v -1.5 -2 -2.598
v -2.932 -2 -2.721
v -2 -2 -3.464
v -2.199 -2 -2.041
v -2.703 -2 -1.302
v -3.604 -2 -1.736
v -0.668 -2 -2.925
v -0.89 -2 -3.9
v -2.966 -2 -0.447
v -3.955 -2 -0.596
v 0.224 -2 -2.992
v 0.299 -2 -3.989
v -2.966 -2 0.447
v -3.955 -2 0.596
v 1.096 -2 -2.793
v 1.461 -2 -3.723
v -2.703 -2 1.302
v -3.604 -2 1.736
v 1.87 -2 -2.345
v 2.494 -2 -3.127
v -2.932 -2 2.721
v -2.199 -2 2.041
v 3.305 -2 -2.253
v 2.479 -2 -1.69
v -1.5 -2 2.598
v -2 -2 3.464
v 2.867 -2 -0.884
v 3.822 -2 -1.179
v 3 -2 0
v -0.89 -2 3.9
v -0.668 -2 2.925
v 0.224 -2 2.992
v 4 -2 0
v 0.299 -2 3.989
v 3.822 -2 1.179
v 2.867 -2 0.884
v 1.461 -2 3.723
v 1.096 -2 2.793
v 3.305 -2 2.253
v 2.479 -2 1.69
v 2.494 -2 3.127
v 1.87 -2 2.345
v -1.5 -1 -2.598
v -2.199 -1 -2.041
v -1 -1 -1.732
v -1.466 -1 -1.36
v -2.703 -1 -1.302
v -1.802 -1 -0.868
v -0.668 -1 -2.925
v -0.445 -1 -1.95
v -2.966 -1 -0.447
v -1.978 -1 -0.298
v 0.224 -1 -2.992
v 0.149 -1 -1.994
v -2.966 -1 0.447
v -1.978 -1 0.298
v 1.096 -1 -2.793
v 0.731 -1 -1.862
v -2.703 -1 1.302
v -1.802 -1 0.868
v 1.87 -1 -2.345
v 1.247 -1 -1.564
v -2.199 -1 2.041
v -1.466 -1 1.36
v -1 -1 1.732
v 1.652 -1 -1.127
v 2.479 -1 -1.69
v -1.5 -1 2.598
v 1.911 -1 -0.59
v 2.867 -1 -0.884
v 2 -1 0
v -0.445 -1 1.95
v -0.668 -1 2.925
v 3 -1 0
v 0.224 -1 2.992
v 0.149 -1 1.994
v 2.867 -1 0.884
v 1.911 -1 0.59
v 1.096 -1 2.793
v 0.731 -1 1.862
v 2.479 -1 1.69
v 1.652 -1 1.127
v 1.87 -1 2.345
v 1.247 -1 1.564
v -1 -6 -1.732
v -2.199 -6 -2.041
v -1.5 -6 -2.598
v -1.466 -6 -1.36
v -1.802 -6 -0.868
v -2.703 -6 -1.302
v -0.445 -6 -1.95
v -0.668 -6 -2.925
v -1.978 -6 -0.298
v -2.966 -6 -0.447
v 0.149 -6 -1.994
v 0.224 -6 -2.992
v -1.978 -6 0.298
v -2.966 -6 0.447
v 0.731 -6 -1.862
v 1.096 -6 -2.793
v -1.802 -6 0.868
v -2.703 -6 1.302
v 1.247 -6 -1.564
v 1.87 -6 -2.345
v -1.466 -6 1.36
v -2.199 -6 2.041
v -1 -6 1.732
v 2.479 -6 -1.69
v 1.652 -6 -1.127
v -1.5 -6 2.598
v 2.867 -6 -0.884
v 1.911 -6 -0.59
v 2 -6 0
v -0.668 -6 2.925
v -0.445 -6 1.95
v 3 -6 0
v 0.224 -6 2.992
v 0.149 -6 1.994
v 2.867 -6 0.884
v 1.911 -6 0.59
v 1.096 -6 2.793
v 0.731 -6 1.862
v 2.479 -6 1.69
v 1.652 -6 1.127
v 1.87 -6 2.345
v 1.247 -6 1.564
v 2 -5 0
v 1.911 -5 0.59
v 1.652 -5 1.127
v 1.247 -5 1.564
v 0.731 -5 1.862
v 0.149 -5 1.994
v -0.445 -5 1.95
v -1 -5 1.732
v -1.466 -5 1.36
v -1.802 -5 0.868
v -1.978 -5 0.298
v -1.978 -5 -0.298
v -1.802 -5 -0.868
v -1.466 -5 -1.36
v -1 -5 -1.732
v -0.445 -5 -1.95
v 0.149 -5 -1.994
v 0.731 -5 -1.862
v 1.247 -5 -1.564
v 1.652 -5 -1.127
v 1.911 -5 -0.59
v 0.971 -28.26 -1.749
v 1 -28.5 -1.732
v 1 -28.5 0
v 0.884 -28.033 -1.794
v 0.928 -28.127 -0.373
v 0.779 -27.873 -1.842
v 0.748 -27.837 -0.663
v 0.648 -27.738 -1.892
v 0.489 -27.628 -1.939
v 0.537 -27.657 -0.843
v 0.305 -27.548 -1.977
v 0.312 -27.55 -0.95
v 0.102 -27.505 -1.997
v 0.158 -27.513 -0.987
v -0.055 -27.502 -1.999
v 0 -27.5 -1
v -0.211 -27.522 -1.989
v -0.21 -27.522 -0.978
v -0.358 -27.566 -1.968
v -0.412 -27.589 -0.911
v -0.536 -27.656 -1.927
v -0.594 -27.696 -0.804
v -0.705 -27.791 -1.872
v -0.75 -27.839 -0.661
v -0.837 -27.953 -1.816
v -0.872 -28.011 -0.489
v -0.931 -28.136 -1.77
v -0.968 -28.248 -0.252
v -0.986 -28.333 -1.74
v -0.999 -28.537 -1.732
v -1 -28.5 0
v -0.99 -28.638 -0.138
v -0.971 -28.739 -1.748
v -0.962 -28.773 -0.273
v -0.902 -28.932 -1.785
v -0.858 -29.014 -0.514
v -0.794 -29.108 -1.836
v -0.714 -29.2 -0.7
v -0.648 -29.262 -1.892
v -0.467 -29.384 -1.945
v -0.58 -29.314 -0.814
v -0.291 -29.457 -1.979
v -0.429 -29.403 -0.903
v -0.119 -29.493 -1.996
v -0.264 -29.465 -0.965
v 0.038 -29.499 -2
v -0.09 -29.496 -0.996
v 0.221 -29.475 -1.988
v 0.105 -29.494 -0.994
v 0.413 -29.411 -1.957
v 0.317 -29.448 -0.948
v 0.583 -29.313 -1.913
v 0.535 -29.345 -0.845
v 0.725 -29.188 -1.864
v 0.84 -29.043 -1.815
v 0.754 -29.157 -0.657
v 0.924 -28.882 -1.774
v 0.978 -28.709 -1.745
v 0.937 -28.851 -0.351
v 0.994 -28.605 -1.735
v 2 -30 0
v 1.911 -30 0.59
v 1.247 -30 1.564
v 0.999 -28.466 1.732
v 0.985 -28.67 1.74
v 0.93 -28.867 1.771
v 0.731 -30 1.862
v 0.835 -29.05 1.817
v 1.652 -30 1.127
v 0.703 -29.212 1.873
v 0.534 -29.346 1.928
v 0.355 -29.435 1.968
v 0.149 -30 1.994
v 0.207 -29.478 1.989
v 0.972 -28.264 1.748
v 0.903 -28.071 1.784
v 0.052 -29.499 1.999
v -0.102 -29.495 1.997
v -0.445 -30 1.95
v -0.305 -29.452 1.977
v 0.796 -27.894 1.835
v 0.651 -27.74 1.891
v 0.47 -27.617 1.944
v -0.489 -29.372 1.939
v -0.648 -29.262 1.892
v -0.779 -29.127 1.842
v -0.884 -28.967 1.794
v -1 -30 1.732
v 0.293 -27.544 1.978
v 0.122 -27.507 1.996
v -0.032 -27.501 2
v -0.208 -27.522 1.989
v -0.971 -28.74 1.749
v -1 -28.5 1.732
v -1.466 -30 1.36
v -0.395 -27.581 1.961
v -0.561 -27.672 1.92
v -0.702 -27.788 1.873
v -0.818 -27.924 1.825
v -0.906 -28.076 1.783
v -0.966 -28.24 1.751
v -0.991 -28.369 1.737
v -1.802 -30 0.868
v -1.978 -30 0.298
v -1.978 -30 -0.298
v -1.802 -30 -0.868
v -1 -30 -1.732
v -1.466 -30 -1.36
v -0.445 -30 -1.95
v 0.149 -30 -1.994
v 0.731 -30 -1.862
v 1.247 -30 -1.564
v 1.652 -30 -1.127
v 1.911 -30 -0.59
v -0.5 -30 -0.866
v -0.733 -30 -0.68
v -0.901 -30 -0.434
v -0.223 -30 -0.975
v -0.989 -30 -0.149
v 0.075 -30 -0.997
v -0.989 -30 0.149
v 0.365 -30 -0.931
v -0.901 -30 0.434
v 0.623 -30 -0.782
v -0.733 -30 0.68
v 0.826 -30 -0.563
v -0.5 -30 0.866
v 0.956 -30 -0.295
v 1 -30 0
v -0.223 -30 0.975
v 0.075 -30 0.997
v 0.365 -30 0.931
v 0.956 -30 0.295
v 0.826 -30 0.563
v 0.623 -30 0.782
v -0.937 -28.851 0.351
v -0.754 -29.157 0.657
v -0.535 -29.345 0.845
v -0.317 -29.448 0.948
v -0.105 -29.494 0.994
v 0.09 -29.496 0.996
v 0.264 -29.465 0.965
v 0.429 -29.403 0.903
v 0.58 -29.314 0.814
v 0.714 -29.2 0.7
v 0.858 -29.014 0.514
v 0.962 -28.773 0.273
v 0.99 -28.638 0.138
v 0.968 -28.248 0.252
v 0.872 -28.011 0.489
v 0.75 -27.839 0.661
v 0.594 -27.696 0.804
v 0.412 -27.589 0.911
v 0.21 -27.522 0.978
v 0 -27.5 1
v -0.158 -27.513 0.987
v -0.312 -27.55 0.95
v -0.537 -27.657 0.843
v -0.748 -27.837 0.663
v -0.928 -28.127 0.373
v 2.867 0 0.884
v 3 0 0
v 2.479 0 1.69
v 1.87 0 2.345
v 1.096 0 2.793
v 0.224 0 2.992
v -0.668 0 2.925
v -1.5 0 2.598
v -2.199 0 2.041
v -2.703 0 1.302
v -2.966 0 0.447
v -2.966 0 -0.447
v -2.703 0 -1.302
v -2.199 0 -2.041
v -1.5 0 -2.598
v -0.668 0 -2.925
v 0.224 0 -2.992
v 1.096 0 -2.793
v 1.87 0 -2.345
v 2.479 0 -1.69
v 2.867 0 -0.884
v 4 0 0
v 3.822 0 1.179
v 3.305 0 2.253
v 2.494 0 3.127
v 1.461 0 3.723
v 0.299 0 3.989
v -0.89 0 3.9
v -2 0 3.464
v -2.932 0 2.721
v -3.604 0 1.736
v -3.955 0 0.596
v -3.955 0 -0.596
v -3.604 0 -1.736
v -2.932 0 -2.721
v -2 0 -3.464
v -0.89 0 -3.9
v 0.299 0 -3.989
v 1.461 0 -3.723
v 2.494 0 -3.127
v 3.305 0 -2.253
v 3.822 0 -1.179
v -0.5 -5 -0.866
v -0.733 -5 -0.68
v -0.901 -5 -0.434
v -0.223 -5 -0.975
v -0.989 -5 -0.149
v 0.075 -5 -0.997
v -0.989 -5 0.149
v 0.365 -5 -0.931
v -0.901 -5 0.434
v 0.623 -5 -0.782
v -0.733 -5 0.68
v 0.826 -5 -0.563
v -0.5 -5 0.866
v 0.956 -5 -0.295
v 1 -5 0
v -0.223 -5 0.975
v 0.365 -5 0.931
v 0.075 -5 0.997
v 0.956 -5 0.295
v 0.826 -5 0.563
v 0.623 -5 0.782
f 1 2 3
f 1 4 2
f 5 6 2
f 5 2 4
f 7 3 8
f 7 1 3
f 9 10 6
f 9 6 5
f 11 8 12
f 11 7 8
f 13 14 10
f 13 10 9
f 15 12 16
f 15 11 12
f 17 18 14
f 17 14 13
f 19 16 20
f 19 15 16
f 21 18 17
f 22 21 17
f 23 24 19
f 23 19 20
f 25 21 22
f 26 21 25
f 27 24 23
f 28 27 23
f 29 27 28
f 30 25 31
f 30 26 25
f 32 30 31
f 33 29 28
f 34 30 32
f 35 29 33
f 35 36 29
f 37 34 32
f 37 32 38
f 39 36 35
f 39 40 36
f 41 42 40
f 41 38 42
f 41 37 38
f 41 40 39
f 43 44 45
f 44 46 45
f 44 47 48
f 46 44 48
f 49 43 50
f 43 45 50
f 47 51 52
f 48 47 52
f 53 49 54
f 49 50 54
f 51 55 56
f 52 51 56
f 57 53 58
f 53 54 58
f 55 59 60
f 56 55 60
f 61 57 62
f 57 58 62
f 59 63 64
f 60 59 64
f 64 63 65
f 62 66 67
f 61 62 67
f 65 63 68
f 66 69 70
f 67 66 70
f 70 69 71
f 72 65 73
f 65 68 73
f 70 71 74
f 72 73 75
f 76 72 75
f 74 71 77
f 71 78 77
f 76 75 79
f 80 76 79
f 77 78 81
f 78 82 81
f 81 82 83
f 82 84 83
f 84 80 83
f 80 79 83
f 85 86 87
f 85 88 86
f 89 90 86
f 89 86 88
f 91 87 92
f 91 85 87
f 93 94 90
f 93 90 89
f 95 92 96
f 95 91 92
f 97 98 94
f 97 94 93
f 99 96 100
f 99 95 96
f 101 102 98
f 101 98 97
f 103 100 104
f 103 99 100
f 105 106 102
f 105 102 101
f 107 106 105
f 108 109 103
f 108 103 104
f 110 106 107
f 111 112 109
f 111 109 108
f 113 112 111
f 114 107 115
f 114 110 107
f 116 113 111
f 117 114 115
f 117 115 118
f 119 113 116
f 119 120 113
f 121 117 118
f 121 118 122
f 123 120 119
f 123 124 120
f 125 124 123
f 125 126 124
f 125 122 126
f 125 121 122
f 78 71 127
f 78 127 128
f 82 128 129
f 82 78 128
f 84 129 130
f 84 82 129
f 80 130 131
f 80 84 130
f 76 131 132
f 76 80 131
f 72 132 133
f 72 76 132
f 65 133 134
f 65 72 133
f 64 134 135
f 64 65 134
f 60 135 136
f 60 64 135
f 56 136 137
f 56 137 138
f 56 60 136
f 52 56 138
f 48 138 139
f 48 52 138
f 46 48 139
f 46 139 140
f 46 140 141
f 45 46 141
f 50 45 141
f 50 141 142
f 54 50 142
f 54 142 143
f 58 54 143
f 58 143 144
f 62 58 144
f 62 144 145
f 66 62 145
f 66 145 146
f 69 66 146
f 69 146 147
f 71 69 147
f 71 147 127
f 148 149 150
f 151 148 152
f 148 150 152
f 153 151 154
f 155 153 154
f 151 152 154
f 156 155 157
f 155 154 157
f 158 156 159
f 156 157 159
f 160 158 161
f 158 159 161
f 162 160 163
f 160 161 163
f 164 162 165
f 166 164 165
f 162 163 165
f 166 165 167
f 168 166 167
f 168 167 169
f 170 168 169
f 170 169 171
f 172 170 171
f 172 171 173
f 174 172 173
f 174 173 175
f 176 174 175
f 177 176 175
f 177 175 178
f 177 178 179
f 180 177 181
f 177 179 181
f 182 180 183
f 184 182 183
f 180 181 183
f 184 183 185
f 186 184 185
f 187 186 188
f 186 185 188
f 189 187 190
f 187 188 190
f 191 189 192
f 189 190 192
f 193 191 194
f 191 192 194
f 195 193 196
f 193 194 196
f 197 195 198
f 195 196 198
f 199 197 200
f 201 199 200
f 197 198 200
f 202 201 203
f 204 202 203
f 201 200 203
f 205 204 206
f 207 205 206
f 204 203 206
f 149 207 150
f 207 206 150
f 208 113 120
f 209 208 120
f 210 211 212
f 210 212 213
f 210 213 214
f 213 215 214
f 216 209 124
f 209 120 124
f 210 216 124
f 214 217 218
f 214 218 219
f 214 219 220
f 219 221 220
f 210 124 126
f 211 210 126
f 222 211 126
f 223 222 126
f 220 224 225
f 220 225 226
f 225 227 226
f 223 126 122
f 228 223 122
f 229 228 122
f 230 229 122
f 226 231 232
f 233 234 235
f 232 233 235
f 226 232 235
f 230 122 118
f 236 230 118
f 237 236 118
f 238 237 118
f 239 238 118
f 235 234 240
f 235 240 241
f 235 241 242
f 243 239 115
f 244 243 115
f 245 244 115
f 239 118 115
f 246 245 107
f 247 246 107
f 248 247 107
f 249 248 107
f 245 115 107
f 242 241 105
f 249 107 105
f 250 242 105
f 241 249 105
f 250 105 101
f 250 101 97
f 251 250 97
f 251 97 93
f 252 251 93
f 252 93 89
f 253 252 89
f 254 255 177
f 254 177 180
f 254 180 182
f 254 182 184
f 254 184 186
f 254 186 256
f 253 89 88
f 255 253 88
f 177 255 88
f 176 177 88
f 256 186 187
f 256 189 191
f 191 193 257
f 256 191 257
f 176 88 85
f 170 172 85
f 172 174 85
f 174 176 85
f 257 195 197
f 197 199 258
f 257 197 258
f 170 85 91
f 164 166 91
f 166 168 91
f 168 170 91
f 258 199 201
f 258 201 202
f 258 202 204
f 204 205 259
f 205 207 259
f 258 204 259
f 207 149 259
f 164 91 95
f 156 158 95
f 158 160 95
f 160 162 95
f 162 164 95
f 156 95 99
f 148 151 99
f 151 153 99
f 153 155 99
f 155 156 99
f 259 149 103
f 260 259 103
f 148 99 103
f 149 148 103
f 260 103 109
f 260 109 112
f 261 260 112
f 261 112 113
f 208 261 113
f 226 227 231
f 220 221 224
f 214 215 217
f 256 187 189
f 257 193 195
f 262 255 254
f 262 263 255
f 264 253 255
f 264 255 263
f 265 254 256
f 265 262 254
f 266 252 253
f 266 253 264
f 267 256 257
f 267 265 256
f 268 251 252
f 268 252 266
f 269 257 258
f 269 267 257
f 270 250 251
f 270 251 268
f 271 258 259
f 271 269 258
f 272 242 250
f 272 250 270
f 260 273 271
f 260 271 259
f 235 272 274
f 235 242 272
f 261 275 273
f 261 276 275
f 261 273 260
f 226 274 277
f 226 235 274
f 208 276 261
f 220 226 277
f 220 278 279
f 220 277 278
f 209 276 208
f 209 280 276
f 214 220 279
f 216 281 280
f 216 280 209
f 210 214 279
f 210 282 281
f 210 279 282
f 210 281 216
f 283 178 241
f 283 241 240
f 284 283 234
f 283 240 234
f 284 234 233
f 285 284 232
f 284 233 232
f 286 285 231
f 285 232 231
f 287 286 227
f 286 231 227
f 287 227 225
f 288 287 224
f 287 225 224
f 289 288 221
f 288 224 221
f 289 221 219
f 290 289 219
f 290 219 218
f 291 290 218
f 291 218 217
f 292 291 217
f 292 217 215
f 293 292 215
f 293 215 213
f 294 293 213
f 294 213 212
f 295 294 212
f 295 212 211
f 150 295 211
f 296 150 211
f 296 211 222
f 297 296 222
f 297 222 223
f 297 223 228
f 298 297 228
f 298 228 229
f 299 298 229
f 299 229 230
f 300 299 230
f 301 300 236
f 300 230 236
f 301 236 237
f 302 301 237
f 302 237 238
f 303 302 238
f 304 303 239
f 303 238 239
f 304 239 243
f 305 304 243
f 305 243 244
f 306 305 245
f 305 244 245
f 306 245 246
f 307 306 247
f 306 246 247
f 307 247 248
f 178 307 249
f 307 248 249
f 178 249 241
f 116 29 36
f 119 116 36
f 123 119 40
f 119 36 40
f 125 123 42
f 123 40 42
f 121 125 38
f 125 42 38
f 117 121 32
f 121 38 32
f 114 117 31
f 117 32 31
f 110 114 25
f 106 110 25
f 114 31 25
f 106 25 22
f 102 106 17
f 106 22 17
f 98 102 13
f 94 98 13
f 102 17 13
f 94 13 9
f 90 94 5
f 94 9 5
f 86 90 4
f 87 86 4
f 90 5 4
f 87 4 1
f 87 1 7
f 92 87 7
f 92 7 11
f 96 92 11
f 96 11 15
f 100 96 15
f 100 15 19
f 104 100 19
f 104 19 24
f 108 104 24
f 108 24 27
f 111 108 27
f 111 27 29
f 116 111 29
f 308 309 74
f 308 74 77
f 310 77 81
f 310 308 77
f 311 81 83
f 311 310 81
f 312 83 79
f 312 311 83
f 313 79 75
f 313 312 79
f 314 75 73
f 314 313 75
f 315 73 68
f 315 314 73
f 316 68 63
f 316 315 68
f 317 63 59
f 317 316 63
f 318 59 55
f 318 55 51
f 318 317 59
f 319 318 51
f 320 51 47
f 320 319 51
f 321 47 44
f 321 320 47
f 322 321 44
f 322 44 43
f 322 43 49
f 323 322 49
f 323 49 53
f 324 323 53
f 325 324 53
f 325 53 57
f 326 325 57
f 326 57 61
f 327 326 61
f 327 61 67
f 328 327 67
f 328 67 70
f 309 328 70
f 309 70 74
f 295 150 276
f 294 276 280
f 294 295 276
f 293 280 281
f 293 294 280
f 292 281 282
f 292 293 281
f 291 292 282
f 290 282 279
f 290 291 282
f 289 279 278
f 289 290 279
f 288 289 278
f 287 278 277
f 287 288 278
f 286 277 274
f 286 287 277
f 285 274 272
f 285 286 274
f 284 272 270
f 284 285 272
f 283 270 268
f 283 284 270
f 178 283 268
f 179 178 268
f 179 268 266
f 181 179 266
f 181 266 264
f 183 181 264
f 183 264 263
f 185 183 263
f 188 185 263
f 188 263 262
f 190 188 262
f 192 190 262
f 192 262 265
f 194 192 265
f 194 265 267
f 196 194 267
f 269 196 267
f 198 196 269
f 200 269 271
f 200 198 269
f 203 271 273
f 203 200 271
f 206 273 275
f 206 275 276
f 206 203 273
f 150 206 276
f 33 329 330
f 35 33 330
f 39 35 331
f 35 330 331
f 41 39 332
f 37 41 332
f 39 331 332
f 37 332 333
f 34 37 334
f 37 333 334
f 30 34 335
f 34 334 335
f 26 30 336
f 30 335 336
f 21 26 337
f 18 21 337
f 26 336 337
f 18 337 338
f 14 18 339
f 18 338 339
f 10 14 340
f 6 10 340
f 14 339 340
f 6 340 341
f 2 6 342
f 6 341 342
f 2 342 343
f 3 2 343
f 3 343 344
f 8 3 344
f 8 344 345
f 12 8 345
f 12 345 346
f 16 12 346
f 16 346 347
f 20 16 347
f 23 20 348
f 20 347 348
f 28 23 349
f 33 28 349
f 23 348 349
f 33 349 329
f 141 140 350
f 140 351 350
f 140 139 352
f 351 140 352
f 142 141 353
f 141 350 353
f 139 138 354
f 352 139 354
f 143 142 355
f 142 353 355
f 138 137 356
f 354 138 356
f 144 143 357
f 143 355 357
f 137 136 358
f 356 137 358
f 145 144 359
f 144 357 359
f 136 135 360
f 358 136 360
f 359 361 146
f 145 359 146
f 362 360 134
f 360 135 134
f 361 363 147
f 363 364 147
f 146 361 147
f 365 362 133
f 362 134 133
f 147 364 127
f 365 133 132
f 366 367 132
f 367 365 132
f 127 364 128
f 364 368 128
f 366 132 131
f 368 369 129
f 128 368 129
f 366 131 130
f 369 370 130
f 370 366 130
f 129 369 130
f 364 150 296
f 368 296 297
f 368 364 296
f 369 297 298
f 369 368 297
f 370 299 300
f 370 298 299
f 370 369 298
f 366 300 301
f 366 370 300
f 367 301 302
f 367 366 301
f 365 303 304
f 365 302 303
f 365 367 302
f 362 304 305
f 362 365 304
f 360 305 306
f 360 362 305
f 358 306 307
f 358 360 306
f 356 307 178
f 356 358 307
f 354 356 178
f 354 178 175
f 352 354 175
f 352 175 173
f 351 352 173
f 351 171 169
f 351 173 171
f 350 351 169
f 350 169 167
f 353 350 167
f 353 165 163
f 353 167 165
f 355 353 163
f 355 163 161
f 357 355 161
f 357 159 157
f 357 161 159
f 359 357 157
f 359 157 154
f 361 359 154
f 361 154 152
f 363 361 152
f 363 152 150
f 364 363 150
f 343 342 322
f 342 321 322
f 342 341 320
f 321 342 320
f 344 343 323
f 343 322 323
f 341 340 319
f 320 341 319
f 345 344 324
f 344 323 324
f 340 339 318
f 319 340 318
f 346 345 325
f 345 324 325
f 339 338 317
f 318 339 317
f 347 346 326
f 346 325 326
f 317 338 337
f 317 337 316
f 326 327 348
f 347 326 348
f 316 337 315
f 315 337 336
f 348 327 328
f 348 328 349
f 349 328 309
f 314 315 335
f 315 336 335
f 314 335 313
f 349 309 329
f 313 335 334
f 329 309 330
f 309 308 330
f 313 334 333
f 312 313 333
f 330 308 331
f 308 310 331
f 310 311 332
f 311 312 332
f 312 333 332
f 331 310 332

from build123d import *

# Parameters (mm, degrees)
F0_R     = 4
F0_R_2   = 3
F1_DEPTH = 2
F2_START = 1
F0_R_3   = 2
F2_DEPTH = 5
F3_START = 5
F0_R_4   = 1
F3_DEPTH = 25
F5_D     = 2
F5_DEPTH = 4.001
F6_D     = 2


with BuildPart() as f1:
    # F0 (on Front) → F1 (new body)
    with BuildSketch(Plane.XZ):
        Circle(F0_R)
        Circle(F0_R_2, mode=Mode.SUBTRACT)
    extrude(amount=F1_DEPTH)

    # F0 (on Front) → F2 (join)
    with BuildSketch(Plane.XZ.offset(F2_START)):
        Circle(F0_R_2)
        Circle(F0_R_3, mode=Mode.SUBTRACT)
    extrude(amount=F2_DEPTH)

    # F0 (on Front) → F3 (join)
    with BuildSketch(Plane.XZ.offset(F3_START)):
        Circle(F0_R_3)
        Circle(F0_R_4, mode=Mode.SUBTRACT)
    extrude(amount=F3_DEPTH)

    # F5 (through all, one way)
    with BuildSketch(Plane.XY):
        with Locations((0, -28.5)):
            Circle(F5_D / 2)
    extrude(amount=-F5_DEPTH, mode=Mode.SUBTRACT)

    # F6 (through all)
    with Locations(Plane(origin=(0, 0, 0), x_dir=(1, 0, 0), z_dir=(0, 0, -1))):
        with Locations((0, 28.5)):
            Hole(F6_D / 2)


solid = f1.part
